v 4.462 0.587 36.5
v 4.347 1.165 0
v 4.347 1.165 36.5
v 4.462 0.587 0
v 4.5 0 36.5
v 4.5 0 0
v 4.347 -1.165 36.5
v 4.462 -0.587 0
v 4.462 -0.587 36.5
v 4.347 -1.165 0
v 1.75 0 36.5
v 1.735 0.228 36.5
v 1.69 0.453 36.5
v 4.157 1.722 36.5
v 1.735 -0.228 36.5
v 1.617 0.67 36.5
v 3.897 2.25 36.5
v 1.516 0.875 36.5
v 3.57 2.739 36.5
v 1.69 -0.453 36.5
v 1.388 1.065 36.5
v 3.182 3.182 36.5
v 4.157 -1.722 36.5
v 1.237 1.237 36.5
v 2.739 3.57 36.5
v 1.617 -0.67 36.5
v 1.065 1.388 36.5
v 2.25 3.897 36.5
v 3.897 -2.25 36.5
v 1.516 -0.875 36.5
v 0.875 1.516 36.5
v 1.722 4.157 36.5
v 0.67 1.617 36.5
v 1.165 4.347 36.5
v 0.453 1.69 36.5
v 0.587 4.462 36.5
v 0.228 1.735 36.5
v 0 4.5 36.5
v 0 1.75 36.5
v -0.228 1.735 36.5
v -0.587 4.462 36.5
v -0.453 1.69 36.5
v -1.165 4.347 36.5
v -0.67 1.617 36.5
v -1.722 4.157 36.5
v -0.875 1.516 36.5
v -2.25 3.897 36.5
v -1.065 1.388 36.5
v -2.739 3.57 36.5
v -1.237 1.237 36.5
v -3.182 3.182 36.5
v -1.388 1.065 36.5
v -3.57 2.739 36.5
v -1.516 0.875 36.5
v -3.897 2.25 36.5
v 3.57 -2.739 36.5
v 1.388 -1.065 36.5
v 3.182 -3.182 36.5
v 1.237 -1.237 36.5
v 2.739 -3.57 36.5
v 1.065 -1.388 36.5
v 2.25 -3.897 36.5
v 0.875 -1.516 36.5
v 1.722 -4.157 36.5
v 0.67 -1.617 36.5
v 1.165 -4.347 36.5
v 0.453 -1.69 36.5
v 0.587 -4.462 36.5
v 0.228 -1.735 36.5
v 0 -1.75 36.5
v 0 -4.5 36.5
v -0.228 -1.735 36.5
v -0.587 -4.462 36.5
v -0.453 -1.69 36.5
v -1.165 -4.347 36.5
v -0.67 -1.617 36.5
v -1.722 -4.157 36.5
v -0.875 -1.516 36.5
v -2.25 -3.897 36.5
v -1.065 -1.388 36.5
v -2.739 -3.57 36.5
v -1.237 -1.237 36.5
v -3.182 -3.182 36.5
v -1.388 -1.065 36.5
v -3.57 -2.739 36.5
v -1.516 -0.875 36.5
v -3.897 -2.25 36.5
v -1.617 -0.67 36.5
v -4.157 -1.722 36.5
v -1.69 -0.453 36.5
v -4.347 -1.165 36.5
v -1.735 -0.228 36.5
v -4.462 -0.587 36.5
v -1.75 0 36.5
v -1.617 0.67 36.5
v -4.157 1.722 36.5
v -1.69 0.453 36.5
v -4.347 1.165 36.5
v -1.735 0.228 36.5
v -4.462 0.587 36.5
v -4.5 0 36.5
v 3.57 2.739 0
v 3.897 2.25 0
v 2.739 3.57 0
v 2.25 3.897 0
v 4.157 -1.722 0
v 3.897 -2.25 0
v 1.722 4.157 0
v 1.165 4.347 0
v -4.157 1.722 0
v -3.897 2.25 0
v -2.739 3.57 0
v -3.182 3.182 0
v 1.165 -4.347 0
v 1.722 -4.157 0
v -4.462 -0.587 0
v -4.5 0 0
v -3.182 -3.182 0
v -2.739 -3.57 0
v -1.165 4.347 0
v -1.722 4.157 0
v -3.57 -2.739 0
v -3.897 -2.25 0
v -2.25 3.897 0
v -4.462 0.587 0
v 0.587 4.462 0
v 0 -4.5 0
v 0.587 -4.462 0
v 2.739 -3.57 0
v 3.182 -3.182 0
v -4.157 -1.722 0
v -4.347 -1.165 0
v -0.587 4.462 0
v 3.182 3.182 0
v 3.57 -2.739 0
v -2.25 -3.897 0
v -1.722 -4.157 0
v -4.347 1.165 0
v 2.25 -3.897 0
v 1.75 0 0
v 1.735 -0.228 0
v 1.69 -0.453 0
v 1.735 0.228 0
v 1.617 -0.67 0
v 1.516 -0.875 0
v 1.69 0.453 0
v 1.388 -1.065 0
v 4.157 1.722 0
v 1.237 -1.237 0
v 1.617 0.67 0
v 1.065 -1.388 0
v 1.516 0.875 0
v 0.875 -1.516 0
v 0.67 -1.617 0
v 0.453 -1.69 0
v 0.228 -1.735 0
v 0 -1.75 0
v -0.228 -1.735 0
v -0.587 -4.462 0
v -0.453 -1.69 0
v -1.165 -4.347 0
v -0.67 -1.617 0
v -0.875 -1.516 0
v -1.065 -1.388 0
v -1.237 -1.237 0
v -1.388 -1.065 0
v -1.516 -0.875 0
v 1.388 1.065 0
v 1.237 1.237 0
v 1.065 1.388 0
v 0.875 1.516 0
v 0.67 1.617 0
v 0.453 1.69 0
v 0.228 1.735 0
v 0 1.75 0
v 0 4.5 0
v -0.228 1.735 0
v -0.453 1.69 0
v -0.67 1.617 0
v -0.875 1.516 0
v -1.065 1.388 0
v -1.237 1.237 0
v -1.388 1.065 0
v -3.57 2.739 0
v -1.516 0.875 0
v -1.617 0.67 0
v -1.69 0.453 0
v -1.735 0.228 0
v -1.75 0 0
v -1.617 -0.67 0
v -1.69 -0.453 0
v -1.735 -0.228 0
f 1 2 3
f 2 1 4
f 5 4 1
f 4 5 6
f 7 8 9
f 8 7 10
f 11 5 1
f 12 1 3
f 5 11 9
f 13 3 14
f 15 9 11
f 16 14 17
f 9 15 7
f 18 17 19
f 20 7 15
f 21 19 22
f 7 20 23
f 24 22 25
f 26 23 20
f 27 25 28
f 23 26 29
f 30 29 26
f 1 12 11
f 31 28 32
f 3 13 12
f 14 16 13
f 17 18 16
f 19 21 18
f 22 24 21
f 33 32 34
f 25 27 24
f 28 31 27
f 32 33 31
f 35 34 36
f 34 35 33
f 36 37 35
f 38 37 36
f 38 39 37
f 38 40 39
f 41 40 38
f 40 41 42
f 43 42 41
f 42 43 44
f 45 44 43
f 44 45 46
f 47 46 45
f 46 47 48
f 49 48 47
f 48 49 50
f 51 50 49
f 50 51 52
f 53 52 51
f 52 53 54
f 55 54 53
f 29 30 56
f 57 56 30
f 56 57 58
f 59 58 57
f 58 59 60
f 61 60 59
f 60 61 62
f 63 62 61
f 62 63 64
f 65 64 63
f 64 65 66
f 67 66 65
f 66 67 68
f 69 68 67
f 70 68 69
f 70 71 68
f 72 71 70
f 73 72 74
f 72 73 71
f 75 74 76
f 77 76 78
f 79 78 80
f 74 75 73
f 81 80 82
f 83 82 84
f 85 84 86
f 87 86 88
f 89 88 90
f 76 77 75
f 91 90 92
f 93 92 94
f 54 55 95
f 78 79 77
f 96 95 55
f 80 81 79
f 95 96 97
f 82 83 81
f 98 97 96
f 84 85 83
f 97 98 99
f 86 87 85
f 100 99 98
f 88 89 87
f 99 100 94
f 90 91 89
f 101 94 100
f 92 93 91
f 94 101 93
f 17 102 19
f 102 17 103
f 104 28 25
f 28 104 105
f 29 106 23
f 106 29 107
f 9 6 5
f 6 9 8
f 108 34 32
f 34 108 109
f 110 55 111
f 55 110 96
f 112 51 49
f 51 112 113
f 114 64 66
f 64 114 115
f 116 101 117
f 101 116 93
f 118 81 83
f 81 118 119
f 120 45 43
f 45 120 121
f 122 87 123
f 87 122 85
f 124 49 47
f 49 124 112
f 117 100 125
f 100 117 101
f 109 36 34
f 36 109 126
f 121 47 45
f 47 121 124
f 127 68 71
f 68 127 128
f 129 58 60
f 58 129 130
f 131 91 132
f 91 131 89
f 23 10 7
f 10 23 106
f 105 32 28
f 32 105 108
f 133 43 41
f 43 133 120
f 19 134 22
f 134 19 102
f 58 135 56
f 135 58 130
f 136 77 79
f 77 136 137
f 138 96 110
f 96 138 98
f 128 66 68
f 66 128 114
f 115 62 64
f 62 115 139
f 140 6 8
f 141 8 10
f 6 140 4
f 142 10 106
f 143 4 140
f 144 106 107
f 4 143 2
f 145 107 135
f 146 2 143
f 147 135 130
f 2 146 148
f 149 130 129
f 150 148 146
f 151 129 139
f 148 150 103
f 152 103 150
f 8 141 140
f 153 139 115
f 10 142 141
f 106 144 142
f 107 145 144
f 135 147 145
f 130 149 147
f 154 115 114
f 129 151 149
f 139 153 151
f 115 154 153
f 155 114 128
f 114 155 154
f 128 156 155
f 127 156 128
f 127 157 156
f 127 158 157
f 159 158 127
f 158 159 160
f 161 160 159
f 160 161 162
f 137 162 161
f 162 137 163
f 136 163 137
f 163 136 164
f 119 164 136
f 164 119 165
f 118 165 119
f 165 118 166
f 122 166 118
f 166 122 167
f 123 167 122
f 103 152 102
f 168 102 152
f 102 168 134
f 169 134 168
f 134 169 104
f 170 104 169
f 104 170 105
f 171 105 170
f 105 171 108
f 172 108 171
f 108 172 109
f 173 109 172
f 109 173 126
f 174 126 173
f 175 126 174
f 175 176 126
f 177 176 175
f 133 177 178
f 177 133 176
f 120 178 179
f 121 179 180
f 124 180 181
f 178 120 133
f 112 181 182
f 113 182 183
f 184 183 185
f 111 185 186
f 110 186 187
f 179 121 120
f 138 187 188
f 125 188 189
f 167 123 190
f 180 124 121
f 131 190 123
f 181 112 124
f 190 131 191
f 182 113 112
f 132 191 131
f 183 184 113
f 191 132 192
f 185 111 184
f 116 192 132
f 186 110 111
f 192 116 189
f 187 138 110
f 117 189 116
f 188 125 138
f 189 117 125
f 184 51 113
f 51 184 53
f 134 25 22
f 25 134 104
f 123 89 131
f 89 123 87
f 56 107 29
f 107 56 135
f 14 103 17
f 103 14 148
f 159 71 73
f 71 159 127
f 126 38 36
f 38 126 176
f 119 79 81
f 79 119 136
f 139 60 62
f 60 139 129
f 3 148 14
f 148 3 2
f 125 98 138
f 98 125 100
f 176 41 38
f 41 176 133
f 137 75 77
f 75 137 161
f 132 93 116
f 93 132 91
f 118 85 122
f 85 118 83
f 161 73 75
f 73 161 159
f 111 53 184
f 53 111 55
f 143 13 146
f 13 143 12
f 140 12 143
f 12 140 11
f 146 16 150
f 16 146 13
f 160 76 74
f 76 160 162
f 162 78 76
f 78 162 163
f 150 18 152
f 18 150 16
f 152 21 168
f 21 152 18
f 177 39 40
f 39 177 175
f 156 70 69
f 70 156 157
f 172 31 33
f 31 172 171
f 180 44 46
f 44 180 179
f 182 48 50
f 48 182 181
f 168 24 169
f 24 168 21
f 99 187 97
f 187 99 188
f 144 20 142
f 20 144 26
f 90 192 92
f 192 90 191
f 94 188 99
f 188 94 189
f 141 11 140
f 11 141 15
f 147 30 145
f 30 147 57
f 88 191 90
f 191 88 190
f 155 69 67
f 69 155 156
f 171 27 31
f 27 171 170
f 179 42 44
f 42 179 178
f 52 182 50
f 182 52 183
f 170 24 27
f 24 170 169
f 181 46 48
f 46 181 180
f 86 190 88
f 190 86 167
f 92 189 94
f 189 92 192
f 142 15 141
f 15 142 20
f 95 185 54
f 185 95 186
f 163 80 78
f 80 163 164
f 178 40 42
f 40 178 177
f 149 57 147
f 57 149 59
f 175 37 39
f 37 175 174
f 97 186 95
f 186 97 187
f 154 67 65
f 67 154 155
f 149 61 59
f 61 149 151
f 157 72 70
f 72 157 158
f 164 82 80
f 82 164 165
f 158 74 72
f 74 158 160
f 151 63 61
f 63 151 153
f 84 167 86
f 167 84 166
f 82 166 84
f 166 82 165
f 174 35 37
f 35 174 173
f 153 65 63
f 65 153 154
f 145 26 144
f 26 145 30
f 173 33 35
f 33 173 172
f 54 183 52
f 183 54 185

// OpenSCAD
// file: parameters.scad
// =============================================================================
// Gen-BW — nightly 2026-10-10 (physics_scorer, honest magpylib watts)
// Stacked poles: two Ø20×5 per pocket (10 mm poles), 4 per rotor at R52, trading pole count for field — peak Bz at the copper rises to ≈0.73 T (vs 0.54 T on Gen-BR), which lets a thin 6.75 mm copper layer with a very deep 21 mm build carry the turns. But the electrical frequency halves, and the scorer puts it at about 45 % of Gen-BR: the thicker magnets do not make up for half the poles.
// Clocking 0 deg (magnets N facing S) + D-flat keyed bore + index notch + flip-symmetric hole map.
// Windable 2-piece bobbin; turns = physics_scorer turns_fit; copper only between flanges.
// Steel back-iron: 2× Ø134 × 6.35 mm (1/4") mild-steel discs (steel_backiron_disc.dxf); magnets sit ON the steel
// (through-pockets) -> score with --back-iron. Night 2026-10-10.
// =============================================================================
topology            = "dual_rotor";

// --- Wire / winding (physics_scorer winding-fit) -------------------------------
wire_awg            = 26;
wire_od             = 0.45;     // insulated OD mm (bare 0.405)
fill_realistic      = 0.65;     // insulated-wire area / window (DENSE layered wind with a jig; scorer cap 0.65)
turns               = 586;       // = physics_scorer turns_fit (do NOT raise)
coil_former_type    = "bobbin";
coil_core_inset     = 21.25;     // radial copper build: hub = copper boundary inset by this
wind_build_axial    = 0.0;      // nothing proud of the flanges
wind_build_radial   = 0.0;

// --- Bobbin (base + lid) ---------------------------------------------------------
coil_id_r           = 26.00;    // copper boundary sector
coil_od_r           = 74.00;
span_deg            = 52.72;    // = pitch - 2*asin((wall+0.85)/coil_id_r) -> >=1.2 mm stator web
former_web          = 6.75;     // copper height between flanges (TALL copper: steel keeps Bz up)
flange_t            = 0.80;     // >= 0.8 mm FDM wall rule (tall winds push on the flanges)
wall                = 0.80;     // flange lip beyond copper
former_bare_h       = former_web + 2 * flange_t;
coil_envelope_h     = former_bare_h + 2 * wind_build_axial;
tab_w               = 7.0;
tab_len             = 7.0;
tab_h               = former_bare_h / 2;
pin_d               = 1.9;      // 1.75 mm filament locating pin
coil_mount_r        = coil_od_r + 0.2 + 4.0;
lead_y              = 1.6;
lead_slot_w         = 0.9;
lead_groove_d       = 0.6;

// --- Gap -------------------------------------------------------------------------
run_clear           = 0.50;     // rotor face -> flange
gap_spacer_h        = run_clear + wind_build_axial;
m2m                 = coil_envelope_h + 2 * run_clear;   // rotor face to rotor face (= gap_sleeve length)

// --- Stator ----------------------------------------------------------------------
coil_stations       = 6;
bay_clear           = 0.25;
stator_thick        = former_bare_h;                        // bobbins flush both faces
stator_od           = 166;
shaft_clear_stator  = 14.0;     // stator is static; gap sleeve OD 12 spins inside

// --- Rotor(s) --------------------------------------------------------------------
magnet_Br           = 1.43;     // N52
magnet_d_large      = 20.0;
magnet_h_large      = 10.0;      // two O20x5 stacked per pocket
magnet_h_small      = 5.0;      // unused: no O5 pockets in this kit
halbach_magnetisation = "none";  // NO O5 assist magnets in this kit (scan: they lower the 4-pole score)
rotor_b_same_axis   = true;     // same-index magnets share one axis: N faces S across the gap
large_pocket_d      = 20.3;
small_pocket_d      = 5.3;
pocket_h            = 10.00;     // THROUGH the carrier: magnet back face sits on the steel disc (FLUSH seat: carrier = magnet height, magnet face level with the rotor face)
large_n             = 4;
R_large             = 52.0;
small_r_list        = [];       // no O5 pockets
carrier_od          = 134.0;
carrier_thick       = pocket_h;
hub_h               = 14.0;     // > steel_t + insert: radial set-screw clears the steel
hub_od              = 24.0;     // slim hub so the M4 brace rods fit at R~18 inside the coil ring
hub_insert_d        = 4.0;      // M3 heat-set insert, radial, bears on the D-flat
rotor_b_offset_deg  = 0.0;      // CLOCKING: magnets directly opposite
shaft_key           = "dflat";
dflat_depth         = 0.5;      // 8 mm shaft with 0.5 mm flat (7.5 across flat)
index_notch_d       = 3.0;

// --- Steel back-iron (buyable laser-cut) -------------------------------------------
steel_t             = 6.35;      // mild steel thickness (image method ignores it; sized from steel_flux.py so the return path stays well below saturation)
steel_center_hole   = 26.0;     // slips over the rotor hub (OD 24)
steel_od            = carrier_od;   // steel disc OD = rotor carrier OD

// --- Modular MAX interface ----------------------------------------------------------
shaft_bore          = 8.35;
dflat_x             = 4.0 - dflat_depth + (shaft_bore - 8.0) / 2;
bearing_d           = 21.85;
bearing_h           = 7.2;
m3_clear            = 3.5;
bolt_r_inner        = 30.0;     // M3 steel-disc clamp bolts (inside the magnet ring)
bolt_n_inner        = 4;
bolt_inner_angles   = [0, 90, 180, 270];
bolt_r_outer        = 63.0;     // second M3 steel-disc clamp ring
bolt_outer_angles   = [45, 135, 225, 315];
flange_bolt_r       = 73.0;     // frame rods: OUTSIDE the rotor OD (rotors spin inside them)
flange_bolt_n       = 6;
flange_bolt_offset  = 30.00;    // between coil stations -> never cuts a lead groove/tab
brace_r             = 18.0;
brace_d             = 4.3;      // temporary M4 jack rods (assembly only)
brace_n             = 4;
brace_angles        = [45, 135, 225, 315];          // flip-symmetric

spacer_pad_od       = 14.0;
spacer_pad_id       = m3_clear;
endbell_od          = 156.0;
endbell_thick       = 8.0;
endbell_shaft_clear = 10.0;
collar_h            = 10.0;
standoff_od         = 9.0;
frame_standoff_h    = run_clear + carrier_thick + hub_h + collar_h + 2.0;
sleeve_od           = 12.0;
plate_max_mm        = 410;

$fn = 64;
// main file
// Gen-BW — frame standoff tube between stator and an endbell, on each M3 frame rod (outside rotor OD).
// Print x12. Height = frame_standoff_h (rotor + steel + hub + collar + running clearance).
include <parameters.scad>;
$fn = 48;
difference() {
    cylinder(d=standoff_od, h=frame_standoff_h);
    translate([0, 0, -0.1]) cylinder(d=m3_clear, h=frame_standoff_h + 0.2);
}
